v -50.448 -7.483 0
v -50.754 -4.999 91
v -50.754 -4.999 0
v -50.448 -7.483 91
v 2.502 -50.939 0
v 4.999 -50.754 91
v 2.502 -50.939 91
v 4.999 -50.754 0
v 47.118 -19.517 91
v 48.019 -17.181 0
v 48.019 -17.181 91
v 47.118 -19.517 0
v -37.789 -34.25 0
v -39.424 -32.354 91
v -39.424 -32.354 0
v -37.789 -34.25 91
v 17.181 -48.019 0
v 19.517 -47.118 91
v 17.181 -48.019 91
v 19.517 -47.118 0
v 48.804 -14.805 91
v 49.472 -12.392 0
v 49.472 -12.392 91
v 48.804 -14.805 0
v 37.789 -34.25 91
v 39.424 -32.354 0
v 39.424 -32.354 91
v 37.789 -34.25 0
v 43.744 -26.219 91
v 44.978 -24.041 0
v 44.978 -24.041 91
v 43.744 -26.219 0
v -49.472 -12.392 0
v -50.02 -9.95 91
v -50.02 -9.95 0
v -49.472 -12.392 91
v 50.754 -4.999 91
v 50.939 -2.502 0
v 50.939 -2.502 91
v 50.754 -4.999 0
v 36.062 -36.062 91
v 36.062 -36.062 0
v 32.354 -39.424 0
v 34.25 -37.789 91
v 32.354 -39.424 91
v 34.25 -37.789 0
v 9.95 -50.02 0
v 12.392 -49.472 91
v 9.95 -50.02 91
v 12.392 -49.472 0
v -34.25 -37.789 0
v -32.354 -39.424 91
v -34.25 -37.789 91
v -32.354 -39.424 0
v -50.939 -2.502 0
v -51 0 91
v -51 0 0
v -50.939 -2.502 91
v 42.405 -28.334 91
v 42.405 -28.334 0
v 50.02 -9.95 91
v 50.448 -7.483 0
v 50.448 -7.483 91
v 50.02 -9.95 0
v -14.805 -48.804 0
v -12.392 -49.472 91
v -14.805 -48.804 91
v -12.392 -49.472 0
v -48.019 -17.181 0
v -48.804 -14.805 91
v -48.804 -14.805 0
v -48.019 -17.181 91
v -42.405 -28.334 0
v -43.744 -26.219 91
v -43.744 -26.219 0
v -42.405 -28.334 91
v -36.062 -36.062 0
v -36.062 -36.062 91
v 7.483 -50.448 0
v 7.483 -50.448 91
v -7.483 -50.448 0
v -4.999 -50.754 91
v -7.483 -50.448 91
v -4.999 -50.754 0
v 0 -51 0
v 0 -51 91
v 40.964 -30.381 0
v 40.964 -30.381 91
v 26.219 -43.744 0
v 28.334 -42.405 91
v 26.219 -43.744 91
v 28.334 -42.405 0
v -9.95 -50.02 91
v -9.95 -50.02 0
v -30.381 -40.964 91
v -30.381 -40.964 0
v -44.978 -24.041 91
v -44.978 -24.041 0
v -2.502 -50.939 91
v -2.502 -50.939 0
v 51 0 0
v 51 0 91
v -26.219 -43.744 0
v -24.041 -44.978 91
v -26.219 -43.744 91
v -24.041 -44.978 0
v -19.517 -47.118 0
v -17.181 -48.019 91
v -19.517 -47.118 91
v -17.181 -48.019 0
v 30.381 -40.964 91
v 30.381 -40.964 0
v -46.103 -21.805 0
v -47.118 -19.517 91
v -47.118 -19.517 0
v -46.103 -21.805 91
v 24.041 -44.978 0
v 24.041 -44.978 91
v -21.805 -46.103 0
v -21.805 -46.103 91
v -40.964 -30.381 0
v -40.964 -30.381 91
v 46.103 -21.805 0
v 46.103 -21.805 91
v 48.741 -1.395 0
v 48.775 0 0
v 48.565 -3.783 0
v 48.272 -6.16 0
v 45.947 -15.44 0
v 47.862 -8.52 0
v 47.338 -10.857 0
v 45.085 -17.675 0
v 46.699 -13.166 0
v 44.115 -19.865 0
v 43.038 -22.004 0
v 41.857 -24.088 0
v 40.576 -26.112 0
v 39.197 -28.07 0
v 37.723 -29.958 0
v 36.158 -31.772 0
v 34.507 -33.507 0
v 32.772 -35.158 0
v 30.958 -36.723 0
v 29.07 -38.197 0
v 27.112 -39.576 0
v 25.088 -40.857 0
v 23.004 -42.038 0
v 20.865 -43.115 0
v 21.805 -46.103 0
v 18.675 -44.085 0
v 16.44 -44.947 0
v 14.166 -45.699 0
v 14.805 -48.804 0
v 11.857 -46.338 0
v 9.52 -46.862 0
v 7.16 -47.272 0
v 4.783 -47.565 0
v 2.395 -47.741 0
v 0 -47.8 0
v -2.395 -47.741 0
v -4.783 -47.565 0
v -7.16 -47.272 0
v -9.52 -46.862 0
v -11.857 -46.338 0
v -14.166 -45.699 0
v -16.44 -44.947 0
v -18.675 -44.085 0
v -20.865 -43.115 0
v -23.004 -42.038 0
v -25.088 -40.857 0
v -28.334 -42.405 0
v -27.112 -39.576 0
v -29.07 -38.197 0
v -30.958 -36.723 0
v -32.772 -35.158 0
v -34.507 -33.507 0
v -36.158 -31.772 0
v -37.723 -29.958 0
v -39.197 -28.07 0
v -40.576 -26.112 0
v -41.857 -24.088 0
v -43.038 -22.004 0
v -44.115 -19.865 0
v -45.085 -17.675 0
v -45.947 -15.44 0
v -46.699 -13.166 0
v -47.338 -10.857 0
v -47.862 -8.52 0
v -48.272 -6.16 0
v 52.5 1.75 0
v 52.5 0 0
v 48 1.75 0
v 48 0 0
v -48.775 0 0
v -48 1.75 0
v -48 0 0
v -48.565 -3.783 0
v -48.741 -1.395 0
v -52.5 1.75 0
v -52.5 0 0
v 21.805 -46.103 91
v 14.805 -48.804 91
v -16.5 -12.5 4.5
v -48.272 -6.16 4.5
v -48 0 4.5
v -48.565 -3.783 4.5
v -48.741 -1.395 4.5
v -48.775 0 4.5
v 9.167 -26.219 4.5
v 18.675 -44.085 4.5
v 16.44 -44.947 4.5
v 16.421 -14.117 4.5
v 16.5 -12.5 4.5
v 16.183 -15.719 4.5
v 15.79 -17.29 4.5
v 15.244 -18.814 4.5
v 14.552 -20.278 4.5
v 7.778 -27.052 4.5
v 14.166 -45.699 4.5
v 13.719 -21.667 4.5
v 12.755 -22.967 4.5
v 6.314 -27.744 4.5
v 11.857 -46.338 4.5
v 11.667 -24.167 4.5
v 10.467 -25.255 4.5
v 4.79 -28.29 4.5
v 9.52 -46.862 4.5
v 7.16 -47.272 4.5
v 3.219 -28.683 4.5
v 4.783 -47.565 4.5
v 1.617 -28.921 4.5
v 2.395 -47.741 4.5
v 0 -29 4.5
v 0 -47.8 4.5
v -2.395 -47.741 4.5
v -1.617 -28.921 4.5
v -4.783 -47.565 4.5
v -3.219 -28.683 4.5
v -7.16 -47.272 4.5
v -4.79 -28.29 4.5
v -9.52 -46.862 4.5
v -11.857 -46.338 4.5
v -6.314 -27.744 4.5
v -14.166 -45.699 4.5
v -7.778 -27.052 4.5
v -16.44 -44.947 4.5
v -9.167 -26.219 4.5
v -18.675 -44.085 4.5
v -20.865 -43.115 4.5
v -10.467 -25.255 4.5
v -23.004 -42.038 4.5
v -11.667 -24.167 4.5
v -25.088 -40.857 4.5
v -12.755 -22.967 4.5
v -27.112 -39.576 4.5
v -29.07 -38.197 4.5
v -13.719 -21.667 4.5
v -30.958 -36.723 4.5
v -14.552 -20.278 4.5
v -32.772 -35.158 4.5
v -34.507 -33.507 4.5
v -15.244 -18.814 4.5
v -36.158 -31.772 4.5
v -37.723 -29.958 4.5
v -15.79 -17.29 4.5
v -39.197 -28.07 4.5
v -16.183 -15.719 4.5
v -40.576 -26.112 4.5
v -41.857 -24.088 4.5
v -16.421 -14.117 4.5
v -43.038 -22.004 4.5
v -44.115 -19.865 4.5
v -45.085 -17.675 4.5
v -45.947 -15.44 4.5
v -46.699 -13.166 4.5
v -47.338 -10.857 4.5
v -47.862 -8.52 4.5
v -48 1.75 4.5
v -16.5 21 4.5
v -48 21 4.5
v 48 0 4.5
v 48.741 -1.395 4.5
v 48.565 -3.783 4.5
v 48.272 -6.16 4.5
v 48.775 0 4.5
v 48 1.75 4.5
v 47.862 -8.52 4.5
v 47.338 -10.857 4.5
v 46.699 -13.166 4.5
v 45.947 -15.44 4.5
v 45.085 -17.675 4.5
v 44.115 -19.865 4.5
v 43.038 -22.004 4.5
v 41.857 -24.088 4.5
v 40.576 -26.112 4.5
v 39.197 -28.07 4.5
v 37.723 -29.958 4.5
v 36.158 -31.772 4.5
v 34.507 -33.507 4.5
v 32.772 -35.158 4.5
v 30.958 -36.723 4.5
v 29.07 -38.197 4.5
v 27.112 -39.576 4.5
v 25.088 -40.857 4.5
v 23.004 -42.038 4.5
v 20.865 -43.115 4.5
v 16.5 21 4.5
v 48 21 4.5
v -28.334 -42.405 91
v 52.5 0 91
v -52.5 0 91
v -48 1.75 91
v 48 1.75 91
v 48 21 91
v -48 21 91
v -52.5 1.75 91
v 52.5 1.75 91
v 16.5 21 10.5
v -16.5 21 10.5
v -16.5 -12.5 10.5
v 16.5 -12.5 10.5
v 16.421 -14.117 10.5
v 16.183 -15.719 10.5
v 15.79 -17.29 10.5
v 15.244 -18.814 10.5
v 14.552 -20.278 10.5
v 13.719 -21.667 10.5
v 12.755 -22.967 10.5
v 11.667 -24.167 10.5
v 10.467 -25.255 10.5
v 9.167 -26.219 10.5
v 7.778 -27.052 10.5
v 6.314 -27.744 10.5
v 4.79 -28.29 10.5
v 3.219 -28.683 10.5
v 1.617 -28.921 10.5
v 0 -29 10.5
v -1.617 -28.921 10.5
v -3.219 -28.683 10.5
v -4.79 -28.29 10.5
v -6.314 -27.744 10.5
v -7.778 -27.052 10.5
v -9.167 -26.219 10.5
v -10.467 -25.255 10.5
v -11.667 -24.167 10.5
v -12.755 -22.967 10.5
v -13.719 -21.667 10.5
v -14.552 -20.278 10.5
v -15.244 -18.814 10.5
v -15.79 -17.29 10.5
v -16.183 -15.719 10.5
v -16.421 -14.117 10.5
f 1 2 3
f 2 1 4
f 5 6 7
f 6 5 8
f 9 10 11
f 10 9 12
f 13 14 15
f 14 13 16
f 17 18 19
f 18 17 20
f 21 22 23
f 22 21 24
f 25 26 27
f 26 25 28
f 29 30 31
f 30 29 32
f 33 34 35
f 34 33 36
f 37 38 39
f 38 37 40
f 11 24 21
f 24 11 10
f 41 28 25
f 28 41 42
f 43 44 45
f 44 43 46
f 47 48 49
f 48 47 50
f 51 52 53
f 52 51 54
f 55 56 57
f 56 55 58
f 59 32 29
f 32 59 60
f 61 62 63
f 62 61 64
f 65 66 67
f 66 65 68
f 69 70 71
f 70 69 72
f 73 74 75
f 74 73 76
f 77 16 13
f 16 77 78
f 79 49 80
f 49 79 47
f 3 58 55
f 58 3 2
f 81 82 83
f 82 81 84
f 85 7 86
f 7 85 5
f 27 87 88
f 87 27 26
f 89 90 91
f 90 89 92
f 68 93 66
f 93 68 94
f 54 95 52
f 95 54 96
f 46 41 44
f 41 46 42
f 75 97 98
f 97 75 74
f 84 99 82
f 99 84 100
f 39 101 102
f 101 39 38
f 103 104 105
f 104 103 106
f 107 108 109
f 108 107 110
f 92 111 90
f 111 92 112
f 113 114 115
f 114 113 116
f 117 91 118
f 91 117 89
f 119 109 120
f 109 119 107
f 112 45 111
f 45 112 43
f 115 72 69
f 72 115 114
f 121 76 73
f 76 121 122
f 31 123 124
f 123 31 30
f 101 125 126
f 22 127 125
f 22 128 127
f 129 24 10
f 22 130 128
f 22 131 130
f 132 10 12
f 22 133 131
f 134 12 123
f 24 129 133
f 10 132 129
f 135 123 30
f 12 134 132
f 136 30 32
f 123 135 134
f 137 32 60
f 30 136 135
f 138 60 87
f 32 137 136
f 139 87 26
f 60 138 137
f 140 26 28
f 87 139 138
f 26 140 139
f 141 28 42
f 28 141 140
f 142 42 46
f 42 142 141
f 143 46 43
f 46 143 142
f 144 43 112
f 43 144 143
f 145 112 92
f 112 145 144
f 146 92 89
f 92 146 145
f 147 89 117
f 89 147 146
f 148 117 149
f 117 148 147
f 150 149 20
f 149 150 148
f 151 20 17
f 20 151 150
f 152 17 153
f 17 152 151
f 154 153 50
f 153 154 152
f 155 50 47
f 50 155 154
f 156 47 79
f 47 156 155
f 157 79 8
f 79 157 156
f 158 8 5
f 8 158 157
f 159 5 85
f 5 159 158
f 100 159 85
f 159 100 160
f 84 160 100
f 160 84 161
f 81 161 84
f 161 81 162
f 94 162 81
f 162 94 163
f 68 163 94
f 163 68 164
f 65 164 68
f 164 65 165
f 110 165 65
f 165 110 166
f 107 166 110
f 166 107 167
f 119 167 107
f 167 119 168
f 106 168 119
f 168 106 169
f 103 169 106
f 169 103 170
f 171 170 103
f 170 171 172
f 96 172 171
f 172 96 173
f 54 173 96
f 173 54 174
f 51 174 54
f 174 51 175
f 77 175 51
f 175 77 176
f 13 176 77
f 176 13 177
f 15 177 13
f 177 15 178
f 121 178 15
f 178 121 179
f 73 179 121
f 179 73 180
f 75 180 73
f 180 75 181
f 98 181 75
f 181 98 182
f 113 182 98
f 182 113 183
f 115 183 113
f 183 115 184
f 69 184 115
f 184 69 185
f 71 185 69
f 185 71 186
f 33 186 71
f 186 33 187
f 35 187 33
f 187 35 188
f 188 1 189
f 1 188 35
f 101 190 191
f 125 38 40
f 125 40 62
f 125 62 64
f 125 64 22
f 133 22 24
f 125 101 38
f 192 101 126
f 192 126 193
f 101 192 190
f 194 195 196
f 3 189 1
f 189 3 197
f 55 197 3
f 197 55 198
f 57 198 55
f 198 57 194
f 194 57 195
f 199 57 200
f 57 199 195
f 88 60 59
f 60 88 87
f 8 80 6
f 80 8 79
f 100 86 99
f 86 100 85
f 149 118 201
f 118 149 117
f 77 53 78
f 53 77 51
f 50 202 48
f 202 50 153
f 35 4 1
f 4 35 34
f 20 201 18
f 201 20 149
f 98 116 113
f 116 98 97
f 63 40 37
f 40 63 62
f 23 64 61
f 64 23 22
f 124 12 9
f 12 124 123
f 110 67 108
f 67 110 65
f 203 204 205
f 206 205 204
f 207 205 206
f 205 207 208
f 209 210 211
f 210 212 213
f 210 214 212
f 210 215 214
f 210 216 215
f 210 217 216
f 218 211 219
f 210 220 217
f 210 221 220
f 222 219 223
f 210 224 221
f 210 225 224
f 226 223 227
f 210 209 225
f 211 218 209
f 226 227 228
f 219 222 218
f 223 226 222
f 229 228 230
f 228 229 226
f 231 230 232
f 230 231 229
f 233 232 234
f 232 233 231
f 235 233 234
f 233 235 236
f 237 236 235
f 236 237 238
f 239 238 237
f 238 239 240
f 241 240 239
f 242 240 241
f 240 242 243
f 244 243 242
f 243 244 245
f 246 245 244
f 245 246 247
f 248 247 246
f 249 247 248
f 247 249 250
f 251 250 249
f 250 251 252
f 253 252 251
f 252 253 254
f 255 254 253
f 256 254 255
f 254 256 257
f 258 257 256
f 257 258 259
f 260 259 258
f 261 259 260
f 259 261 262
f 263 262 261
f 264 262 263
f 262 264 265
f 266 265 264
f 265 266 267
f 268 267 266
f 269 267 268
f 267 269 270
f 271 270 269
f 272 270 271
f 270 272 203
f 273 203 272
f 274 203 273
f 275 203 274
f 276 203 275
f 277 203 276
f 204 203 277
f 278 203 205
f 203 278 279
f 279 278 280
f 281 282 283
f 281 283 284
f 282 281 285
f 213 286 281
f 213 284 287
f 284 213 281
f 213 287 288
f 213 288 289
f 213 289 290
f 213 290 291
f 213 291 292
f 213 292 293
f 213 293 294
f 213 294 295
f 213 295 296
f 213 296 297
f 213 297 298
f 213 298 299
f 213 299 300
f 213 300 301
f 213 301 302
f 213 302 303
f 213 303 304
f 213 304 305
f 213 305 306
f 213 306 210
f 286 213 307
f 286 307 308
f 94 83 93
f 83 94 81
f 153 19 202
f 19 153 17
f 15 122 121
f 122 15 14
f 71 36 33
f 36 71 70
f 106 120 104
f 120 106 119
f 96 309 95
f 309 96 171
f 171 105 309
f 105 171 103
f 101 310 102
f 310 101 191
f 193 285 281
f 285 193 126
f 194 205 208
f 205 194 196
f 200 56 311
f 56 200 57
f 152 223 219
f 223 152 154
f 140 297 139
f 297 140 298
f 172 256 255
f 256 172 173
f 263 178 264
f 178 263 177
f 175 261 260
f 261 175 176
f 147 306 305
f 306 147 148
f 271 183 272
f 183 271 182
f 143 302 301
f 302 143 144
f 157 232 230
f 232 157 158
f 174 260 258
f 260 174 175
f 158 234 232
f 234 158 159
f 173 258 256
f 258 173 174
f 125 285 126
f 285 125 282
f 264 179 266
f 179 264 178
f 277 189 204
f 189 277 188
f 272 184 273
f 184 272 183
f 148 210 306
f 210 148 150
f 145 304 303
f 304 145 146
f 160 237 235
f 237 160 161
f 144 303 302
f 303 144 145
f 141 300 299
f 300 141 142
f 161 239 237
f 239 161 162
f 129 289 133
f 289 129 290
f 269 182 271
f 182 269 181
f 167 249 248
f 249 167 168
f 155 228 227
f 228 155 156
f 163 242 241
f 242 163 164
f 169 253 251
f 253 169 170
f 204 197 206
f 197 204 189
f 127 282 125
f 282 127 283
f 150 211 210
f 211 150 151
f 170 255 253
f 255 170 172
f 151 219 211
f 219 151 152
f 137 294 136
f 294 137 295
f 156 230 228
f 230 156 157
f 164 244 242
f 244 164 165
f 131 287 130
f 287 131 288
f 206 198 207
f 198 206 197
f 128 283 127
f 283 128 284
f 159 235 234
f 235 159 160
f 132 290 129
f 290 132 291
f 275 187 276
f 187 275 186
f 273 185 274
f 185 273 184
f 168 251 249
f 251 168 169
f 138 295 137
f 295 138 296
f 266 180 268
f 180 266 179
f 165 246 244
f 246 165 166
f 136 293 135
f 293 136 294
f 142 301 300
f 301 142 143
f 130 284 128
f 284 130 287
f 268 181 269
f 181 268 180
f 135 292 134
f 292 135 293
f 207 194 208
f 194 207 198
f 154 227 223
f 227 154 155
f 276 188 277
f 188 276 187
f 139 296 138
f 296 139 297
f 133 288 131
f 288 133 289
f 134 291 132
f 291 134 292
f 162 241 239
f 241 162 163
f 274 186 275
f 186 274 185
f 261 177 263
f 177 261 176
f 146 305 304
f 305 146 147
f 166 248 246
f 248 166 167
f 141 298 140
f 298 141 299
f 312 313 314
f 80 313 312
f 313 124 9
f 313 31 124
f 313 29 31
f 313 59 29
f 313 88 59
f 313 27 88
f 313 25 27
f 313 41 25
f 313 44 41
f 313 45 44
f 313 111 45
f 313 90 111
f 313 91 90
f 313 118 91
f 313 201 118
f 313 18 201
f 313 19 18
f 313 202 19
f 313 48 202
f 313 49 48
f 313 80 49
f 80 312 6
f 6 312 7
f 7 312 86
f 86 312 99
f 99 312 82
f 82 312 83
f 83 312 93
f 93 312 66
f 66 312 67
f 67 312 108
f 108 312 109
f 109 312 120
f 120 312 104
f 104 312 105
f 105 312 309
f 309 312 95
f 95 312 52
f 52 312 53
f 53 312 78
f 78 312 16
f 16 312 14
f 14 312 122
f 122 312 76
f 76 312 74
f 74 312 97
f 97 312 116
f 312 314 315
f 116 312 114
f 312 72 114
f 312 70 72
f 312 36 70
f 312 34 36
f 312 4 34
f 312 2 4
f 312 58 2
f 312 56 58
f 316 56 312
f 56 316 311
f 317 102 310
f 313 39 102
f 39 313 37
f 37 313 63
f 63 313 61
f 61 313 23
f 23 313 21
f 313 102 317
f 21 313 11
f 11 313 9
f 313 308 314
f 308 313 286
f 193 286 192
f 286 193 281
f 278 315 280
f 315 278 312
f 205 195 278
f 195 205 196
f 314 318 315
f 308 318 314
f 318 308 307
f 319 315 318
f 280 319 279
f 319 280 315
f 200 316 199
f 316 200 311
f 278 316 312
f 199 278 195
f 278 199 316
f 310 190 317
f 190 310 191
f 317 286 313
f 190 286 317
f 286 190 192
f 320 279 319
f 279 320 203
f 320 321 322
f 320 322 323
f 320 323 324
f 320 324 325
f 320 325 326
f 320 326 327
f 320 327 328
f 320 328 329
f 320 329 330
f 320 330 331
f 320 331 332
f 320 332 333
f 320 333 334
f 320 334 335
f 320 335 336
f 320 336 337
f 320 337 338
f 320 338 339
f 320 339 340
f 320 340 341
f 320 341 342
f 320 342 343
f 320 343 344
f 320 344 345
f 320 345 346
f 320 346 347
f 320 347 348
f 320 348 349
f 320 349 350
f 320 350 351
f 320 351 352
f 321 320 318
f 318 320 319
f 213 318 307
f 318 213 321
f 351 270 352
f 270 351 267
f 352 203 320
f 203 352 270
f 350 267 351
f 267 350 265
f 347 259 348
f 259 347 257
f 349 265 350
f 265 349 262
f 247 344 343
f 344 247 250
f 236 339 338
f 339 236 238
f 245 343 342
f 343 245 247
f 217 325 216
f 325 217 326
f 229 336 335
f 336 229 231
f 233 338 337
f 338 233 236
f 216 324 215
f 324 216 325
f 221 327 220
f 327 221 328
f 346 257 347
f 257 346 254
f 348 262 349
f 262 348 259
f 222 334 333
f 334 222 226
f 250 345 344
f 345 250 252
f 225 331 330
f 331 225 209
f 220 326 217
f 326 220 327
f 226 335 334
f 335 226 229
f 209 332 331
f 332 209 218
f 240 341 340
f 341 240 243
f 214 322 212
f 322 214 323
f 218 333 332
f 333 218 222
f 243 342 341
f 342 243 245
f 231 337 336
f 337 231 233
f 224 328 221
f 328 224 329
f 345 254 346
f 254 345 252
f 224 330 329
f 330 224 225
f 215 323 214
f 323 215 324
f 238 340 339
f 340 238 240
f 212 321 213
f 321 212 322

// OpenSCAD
// Coffee receptacle - dimensions in mm
// ======================================

// Key dimensions
outer_radius   = 51.0;
body_height    = 86.5;
prism_width    = 96;
prism_depth    = 21;
lower_flange_h = 4.5;
side_flange_h  = 91.0;
side_flange_w  = 4.5;  // protrusion each side of prism
side_flange_d  = 1.75;
lid_above      = 5;
lid_spigot     = 4.5;
lid_total      = 9.5;
wall           = 2.2;  // body wall thickness
d_width        = 33;   // D-shaped interlock feature
d_depth        = 50;   // front to back
d_height       = 6;    // rises into void from floor plane

// Half cylinder module
module half_cylinder(r, h) {
    difference() {
        cylinder(r=r, h=h, $fn=128);
        translate([-r-1, 0, -1])
            cube([r*2+2, r+1, h+2]);
    }
}

// D-shape module - flat face at y=0, centred on x=0
module d_shape(w, d, h) {
    r = w/2;
    rect_d = d - r;
    union() {
        translate([-r, 0, 0])
            cube([w, rect_d, h]);
        translate([0, rect_d, 0])
            cylinder(r=r, h=h, $fn=64);
    }
}

// Full model - z=0 is bottom of lower cosmetic flange
difference() {

    // Outer body
    union() {

        // Lower cosmetic flange - hollow half cylinder ring at base
        difference() {
            half_cylinder(outer_radius, lower_flange_h);
            translate([0, 1, -1])
                half_cylinder(outer_radius - wall, lower_flange_h + 2);
        }

        // Main body shifted up by lower_flange_h
        translate([0, 0, lower_flange_h]) {

            // Half cylinder body
            half_cylinder(outer_radius, body_height);

            // Prism - centred on flat face
            translate([-prism_width/2, 0, 0])
                cube([prism_width, prism_depth, body_height]);

            // Side flanges
            translate([-prism_width/2 - side_flange_w, 0, body_height - side_flange_h])
                cube([side_flange_w, side_flange_d, side_flange_h]);
            translate([prism_width/2, 0, body_height - side_flange_h])
                cube([side_flange_w, side_flange_d, side_flange_h]);
        }
    }

    // D-shaped interlock recess - subtracted from base, flush with inner prism face
    translate([0, prism_depth + wall
    , lower_flange_h - 1])
        rotate([0, 0, 180])
            d_shape(d_width, d_depth + wall, d_height + 1);
}
